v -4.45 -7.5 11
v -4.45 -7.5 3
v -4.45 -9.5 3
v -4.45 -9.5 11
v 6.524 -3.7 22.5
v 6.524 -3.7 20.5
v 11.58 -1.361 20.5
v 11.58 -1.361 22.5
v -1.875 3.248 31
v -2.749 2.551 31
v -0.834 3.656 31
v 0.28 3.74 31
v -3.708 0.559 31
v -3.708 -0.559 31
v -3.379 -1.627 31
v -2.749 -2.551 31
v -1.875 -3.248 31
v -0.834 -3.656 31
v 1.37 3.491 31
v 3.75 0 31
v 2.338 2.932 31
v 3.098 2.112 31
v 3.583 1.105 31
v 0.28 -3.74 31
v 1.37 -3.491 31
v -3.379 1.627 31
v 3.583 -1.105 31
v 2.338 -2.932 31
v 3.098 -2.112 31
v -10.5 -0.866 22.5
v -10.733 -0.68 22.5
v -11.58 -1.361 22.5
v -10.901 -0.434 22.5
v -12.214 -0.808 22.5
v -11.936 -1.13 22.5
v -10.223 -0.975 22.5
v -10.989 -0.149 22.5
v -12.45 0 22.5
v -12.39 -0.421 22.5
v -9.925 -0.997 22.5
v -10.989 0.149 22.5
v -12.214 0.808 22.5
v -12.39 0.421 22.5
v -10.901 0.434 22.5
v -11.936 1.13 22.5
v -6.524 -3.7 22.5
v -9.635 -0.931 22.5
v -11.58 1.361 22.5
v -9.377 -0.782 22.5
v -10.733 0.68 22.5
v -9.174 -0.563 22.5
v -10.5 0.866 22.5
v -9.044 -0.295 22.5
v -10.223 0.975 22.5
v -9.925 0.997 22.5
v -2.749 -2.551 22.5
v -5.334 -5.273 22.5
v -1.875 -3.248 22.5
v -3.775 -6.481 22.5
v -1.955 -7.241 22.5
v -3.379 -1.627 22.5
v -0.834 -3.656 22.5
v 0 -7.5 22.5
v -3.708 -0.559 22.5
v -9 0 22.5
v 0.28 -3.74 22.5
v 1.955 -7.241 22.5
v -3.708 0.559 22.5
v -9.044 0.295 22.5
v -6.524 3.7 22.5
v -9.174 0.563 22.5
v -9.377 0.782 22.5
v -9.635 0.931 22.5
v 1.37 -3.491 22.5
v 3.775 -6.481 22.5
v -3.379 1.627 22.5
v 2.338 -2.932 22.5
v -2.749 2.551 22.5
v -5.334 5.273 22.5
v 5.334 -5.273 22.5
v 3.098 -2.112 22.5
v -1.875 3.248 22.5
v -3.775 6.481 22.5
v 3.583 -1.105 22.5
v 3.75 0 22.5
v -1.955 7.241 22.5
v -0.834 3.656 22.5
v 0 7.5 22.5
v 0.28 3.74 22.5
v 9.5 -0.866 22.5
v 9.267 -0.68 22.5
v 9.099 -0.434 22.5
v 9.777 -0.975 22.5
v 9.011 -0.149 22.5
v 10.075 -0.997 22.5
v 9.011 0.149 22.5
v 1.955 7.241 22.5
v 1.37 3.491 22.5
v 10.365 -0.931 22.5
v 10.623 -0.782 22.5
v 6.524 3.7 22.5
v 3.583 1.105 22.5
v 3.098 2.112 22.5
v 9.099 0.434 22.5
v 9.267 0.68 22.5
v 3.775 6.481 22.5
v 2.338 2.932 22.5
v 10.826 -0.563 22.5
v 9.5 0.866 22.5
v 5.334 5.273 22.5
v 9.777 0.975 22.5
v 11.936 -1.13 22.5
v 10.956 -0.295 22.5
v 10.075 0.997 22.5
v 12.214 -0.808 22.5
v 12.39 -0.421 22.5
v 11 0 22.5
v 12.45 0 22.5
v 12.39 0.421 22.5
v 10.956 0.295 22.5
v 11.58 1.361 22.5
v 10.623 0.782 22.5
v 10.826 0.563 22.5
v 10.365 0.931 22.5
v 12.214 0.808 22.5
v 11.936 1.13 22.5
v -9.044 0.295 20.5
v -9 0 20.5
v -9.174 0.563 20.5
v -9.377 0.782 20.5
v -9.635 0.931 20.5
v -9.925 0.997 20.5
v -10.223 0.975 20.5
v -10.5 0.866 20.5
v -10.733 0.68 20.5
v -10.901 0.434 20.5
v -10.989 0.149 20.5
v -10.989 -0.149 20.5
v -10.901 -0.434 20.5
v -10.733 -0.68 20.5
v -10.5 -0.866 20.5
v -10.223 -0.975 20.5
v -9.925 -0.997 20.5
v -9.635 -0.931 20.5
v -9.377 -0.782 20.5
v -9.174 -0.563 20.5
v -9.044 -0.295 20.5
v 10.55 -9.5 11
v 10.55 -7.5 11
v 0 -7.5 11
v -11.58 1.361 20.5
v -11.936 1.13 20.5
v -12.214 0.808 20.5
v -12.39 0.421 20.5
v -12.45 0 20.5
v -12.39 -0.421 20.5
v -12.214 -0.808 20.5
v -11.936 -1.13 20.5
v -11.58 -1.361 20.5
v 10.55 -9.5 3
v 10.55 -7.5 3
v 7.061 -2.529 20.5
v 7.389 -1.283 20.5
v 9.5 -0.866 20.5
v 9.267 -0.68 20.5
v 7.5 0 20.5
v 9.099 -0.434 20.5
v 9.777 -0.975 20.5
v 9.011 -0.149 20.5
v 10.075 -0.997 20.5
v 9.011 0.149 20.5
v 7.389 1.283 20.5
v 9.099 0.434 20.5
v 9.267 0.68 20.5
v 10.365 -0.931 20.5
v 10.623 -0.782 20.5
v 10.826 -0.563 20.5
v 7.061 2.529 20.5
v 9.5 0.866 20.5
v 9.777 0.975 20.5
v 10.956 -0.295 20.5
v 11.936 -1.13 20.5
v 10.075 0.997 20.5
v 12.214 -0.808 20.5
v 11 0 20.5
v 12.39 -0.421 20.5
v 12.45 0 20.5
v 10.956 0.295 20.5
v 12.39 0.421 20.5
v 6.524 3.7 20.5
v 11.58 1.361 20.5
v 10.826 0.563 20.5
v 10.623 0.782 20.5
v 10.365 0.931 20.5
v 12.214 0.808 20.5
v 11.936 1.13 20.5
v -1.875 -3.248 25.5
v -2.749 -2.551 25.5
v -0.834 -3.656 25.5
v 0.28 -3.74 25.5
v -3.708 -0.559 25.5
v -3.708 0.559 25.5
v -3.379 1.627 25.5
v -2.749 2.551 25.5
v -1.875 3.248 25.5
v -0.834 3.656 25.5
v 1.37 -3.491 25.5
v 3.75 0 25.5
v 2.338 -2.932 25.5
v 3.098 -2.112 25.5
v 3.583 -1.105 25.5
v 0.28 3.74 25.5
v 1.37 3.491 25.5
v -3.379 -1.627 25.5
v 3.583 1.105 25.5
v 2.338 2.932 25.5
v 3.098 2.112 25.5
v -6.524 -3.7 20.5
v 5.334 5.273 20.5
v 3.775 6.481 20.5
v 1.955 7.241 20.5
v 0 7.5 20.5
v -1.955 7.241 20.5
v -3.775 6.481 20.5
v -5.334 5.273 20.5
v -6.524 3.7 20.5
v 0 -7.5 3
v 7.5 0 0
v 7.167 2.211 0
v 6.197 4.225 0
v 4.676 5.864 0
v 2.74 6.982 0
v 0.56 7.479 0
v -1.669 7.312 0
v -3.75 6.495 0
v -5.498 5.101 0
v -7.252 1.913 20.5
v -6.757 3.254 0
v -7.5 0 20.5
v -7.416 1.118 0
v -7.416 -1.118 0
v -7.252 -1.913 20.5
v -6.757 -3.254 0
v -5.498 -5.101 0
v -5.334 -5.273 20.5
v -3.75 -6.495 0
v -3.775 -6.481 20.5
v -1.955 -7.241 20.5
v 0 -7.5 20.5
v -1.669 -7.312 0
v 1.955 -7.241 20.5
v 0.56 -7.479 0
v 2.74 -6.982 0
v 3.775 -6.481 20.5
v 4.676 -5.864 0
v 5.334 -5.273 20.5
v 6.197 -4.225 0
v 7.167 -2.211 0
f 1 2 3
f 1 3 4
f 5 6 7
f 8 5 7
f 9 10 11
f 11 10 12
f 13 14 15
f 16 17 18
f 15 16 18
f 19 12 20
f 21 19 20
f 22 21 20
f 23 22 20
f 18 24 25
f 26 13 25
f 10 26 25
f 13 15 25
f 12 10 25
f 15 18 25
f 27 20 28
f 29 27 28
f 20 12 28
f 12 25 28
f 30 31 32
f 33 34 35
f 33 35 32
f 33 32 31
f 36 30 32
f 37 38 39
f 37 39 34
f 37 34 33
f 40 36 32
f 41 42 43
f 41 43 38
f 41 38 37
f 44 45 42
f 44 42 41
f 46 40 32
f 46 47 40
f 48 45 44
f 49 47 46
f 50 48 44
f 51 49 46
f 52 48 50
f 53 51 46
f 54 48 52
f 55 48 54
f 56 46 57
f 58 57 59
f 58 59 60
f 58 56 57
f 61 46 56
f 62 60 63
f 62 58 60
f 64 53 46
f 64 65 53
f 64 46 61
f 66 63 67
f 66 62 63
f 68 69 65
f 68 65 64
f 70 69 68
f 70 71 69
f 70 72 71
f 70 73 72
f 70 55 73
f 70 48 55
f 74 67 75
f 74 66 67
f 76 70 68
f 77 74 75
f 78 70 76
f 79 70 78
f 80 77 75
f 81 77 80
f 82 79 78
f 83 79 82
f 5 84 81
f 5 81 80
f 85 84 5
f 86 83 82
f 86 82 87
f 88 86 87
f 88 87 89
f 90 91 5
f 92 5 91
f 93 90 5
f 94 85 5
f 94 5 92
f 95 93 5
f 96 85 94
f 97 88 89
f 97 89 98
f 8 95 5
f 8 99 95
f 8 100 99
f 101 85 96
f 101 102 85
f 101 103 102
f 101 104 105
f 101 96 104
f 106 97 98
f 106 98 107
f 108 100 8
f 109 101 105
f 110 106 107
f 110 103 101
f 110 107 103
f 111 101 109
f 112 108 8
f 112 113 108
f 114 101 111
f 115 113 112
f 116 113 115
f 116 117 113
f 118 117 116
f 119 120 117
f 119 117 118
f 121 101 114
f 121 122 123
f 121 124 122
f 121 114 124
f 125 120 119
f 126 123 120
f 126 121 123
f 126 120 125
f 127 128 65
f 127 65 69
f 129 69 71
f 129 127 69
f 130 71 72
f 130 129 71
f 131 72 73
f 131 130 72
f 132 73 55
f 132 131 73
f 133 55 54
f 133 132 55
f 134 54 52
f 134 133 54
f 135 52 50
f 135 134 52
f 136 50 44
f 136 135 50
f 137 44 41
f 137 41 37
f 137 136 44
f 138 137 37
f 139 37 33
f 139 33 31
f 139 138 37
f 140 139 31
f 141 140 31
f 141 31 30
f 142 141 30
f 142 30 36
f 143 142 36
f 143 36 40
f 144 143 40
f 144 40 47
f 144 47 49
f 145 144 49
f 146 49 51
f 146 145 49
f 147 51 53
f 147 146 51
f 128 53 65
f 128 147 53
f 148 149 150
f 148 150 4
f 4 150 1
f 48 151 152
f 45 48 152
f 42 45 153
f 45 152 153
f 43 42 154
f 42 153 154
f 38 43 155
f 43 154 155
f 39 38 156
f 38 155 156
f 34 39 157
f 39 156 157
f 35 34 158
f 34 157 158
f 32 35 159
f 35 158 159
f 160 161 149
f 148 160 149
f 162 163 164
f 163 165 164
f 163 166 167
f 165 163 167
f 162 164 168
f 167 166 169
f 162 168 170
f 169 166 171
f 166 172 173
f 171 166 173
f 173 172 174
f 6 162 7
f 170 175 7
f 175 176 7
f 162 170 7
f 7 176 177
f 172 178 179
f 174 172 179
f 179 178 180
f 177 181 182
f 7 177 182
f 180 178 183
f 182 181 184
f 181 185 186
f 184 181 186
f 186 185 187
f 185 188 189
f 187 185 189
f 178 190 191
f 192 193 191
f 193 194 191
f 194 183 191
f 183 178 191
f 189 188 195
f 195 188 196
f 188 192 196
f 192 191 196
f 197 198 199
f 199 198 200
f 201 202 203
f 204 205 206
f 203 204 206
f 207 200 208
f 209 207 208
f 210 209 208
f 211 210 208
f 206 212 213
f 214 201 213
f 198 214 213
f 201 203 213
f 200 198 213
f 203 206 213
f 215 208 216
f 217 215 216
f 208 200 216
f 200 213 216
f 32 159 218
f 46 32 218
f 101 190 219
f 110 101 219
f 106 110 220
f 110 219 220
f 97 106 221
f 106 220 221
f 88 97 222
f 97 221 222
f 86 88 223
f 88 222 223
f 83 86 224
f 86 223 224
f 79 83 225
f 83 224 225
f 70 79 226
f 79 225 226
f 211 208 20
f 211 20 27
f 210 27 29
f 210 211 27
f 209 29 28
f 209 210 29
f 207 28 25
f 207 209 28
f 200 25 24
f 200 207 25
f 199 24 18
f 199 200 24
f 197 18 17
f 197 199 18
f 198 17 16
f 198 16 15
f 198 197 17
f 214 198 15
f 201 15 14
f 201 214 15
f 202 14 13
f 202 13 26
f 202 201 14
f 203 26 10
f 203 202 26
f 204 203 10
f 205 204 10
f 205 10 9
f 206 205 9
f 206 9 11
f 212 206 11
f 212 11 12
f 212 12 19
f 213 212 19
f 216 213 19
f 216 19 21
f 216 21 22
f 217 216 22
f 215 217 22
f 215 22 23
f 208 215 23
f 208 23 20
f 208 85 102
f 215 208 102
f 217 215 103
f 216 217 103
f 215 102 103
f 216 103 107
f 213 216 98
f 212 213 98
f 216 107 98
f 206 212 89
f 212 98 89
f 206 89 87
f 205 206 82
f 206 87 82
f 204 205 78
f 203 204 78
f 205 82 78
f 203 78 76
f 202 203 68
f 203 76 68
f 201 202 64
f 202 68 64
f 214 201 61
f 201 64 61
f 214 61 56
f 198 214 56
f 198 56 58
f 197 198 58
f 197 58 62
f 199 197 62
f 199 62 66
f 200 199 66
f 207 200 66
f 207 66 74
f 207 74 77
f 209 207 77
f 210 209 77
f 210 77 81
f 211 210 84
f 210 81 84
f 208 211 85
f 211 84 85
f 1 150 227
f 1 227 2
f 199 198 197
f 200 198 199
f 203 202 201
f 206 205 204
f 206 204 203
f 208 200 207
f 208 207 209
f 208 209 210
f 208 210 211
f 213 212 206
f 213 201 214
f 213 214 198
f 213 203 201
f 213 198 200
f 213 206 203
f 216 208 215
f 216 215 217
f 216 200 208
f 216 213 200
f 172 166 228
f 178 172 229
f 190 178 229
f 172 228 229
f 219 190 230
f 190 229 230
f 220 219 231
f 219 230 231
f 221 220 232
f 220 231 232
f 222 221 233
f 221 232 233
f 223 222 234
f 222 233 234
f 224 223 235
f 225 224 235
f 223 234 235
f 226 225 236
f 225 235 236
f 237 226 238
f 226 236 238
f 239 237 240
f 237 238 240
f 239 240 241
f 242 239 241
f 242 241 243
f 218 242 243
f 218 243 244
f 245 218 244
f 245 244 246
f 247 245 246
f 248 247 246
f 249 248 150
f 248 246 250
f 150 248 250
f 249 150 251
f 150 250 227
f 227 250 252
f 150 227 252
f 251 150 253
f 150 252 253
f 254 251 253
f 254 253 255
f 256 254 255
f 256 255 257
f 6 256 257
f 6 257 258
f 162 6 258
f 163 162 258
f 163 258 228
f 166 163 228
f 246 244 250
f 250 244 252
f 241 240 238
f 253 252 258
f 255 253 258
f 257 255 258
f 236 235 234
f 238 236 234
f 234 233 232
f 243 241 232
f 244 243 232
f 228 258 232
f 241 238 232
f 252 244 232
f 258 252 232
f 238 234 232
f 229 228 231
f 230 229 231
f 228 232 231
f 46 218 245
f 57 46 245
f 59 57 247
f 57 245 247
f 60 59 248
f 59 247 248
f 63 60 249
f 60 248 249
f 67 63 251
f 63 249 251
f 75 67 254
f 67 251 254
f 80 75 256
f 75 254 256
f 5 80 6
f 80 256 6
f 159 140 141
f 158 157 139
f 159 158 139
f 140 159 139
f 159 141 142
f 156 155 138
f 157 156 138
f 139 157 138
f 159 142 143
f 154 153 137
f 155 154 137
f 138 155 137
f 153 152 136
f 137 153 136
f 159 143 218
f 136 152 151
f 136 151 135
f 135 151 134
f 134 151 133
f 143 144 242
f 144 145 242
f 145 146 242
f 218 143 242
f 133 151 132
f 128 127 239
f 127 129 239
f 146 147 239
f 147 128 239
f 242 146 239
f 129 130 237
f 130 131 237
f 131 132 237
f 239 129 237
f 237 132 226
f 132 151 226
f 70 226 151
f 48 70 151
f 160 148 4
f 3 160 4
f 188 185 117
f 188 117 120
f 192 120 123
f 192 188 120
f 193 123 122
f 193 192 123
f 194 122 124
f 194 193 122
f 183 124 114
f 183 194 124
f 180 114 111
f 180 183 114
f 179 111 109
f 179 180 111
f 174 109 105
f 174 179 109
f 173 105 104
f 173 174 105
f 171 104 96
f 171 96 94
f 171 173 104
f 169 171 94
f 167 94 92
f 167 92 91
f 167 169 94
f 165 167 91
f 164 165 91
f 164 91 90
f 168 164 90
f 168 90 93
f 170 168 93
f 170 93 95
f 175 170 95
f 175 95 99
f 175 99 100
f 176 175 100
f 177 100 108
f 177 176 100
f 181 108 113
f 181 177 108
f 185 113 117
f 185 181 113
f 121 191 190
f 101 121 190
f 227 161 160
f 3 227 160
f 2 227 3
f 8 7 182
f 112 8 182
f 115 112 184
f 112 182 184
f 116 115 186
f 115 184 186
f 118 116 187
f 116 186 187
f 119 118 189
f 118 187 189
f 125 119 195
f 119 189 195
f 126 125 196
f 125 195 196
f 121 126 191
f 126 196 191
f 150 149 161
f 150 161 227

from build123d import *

# Parameters (mm, degrees)
F0_R      = 7.5
F3_DEPTH  = 20.5
F4_R      = 1
F4_R_2    = 3.75
F5_DEPTH  = 2
F6_R      = 3.75
F7_DEPTH  = 3
F8_R      = 3.75
F9_DEPTH  = 31
F13_W     = 15
F13_H     = 8
F14_DEPTH = 2


with BuildPart() as f3:
    # F0 (on Top) → F3 (new body, through all)
    with BuildSketch(Plane.XY):
        Circle(F0_R)
    extrude(amount=F3_DEPTH)

    # F4 (on offset) → F5 (join)
    with BuildSketch(Plane.XY.offset(20.5)):
        with BuildLine():
            Line((-6.5238025721, 3.7), (-11.5797156113, 1.3614177349))
            ThreePointArc((-11.5797156113, 1.3614177349), (-12.45, 0), (-11.5797156113, -1.3614177349))
            Line((-11.5797156113, -1.3614177349), (-6.5238025721, -3.7))
            ThreePointArc((-6.5238025721, -3.7), (-7.5, 0), (-6.5238025721, 3.7))
        make_face()
        with Locations((-10, 0)):
            Circle(F4_R, mode=Mode.SUBTRACT)
        with BuildLine():
            ThreePointArc((6.5238025721, 3.7), (0, 7.5), (-6.5238025721, 3.7))
            ThreePointArc((-6.5238025721, 3.7), (-7.5, 0), (-6.5238025721, -3.7))
            ThreePointArc((-6.5238025721, -3.7), (0, -7.5), (6.5238025721, -3.7))
            ThreePointArc((6.5238025721, -3.7), (7.251845258, -1.9133061319), (7.5, 0))
            ThreePointArc((7.5, 0), (7.251845258, 1.9133061319), (6.5238025721, 3.7))
        make_face()
        Circle(F4_R_2, mode=Mode.SUBTRACT)
        with BuildLine():
            Line((11.5797156113, 1.3614177349), (6.5238025721, 3.7))
            ThreePointArc((6.5238025721, 3.7), (7.251845258, 1.9133061319), (7.5, 0))
            ThreePointArc((7.5, 0), (7.251845258, -1.9133061319), (6.5238025721, -3.7))
            Line((6.5238025721, -3.7), (11.5797156113, -1.3614177349))
            ThreePointArc((11.5797156113, -1.3614177349), (12.45, 0), (11.5797156113, 1.3614177349))
        make_face()
        with Locations((10, 0)):
            Circle(F4_R, mode=Mode.SUBTRACT)
        Circle(F4_R_2)
    extrude(amount=F5_DEPTH)

    # F6 (on face) → F7 (join)
    with BuildSketch(Plane.XY.offset(22.5)):
        Circle(F6_R)
    extrude(amount=F7_DEPTH)


with BuildPart() as f9:
    # F8 (on face) → F9 (new body)
    with BuildSketch(Plane(origin=(0, 0, 0), x_dir=(1, 0, 0), z_dir=(0, 0, -1))):
        Circle(F8_R)
    extrude(amount=-F9_DEPTH)

    # F10: cut F3
    add(f3.part, mode=Mode.SUBTRACT)


with BuildPart() as f3_1:
    add(f3.part)

    # F13 (on line) → F14 (join)
    with BuildSketch(Plane(origin=(0, -7.5, 0), x_dir=(-1, 0, 0), z_dir=(0, 1, 0))):
        with Locations((-3.05, 7)):
            Rectangle(F13_W, F13_H)
    extrude(amount=-F14_DEPTH)


solid = Compound([f9.part, f3_1.part])
